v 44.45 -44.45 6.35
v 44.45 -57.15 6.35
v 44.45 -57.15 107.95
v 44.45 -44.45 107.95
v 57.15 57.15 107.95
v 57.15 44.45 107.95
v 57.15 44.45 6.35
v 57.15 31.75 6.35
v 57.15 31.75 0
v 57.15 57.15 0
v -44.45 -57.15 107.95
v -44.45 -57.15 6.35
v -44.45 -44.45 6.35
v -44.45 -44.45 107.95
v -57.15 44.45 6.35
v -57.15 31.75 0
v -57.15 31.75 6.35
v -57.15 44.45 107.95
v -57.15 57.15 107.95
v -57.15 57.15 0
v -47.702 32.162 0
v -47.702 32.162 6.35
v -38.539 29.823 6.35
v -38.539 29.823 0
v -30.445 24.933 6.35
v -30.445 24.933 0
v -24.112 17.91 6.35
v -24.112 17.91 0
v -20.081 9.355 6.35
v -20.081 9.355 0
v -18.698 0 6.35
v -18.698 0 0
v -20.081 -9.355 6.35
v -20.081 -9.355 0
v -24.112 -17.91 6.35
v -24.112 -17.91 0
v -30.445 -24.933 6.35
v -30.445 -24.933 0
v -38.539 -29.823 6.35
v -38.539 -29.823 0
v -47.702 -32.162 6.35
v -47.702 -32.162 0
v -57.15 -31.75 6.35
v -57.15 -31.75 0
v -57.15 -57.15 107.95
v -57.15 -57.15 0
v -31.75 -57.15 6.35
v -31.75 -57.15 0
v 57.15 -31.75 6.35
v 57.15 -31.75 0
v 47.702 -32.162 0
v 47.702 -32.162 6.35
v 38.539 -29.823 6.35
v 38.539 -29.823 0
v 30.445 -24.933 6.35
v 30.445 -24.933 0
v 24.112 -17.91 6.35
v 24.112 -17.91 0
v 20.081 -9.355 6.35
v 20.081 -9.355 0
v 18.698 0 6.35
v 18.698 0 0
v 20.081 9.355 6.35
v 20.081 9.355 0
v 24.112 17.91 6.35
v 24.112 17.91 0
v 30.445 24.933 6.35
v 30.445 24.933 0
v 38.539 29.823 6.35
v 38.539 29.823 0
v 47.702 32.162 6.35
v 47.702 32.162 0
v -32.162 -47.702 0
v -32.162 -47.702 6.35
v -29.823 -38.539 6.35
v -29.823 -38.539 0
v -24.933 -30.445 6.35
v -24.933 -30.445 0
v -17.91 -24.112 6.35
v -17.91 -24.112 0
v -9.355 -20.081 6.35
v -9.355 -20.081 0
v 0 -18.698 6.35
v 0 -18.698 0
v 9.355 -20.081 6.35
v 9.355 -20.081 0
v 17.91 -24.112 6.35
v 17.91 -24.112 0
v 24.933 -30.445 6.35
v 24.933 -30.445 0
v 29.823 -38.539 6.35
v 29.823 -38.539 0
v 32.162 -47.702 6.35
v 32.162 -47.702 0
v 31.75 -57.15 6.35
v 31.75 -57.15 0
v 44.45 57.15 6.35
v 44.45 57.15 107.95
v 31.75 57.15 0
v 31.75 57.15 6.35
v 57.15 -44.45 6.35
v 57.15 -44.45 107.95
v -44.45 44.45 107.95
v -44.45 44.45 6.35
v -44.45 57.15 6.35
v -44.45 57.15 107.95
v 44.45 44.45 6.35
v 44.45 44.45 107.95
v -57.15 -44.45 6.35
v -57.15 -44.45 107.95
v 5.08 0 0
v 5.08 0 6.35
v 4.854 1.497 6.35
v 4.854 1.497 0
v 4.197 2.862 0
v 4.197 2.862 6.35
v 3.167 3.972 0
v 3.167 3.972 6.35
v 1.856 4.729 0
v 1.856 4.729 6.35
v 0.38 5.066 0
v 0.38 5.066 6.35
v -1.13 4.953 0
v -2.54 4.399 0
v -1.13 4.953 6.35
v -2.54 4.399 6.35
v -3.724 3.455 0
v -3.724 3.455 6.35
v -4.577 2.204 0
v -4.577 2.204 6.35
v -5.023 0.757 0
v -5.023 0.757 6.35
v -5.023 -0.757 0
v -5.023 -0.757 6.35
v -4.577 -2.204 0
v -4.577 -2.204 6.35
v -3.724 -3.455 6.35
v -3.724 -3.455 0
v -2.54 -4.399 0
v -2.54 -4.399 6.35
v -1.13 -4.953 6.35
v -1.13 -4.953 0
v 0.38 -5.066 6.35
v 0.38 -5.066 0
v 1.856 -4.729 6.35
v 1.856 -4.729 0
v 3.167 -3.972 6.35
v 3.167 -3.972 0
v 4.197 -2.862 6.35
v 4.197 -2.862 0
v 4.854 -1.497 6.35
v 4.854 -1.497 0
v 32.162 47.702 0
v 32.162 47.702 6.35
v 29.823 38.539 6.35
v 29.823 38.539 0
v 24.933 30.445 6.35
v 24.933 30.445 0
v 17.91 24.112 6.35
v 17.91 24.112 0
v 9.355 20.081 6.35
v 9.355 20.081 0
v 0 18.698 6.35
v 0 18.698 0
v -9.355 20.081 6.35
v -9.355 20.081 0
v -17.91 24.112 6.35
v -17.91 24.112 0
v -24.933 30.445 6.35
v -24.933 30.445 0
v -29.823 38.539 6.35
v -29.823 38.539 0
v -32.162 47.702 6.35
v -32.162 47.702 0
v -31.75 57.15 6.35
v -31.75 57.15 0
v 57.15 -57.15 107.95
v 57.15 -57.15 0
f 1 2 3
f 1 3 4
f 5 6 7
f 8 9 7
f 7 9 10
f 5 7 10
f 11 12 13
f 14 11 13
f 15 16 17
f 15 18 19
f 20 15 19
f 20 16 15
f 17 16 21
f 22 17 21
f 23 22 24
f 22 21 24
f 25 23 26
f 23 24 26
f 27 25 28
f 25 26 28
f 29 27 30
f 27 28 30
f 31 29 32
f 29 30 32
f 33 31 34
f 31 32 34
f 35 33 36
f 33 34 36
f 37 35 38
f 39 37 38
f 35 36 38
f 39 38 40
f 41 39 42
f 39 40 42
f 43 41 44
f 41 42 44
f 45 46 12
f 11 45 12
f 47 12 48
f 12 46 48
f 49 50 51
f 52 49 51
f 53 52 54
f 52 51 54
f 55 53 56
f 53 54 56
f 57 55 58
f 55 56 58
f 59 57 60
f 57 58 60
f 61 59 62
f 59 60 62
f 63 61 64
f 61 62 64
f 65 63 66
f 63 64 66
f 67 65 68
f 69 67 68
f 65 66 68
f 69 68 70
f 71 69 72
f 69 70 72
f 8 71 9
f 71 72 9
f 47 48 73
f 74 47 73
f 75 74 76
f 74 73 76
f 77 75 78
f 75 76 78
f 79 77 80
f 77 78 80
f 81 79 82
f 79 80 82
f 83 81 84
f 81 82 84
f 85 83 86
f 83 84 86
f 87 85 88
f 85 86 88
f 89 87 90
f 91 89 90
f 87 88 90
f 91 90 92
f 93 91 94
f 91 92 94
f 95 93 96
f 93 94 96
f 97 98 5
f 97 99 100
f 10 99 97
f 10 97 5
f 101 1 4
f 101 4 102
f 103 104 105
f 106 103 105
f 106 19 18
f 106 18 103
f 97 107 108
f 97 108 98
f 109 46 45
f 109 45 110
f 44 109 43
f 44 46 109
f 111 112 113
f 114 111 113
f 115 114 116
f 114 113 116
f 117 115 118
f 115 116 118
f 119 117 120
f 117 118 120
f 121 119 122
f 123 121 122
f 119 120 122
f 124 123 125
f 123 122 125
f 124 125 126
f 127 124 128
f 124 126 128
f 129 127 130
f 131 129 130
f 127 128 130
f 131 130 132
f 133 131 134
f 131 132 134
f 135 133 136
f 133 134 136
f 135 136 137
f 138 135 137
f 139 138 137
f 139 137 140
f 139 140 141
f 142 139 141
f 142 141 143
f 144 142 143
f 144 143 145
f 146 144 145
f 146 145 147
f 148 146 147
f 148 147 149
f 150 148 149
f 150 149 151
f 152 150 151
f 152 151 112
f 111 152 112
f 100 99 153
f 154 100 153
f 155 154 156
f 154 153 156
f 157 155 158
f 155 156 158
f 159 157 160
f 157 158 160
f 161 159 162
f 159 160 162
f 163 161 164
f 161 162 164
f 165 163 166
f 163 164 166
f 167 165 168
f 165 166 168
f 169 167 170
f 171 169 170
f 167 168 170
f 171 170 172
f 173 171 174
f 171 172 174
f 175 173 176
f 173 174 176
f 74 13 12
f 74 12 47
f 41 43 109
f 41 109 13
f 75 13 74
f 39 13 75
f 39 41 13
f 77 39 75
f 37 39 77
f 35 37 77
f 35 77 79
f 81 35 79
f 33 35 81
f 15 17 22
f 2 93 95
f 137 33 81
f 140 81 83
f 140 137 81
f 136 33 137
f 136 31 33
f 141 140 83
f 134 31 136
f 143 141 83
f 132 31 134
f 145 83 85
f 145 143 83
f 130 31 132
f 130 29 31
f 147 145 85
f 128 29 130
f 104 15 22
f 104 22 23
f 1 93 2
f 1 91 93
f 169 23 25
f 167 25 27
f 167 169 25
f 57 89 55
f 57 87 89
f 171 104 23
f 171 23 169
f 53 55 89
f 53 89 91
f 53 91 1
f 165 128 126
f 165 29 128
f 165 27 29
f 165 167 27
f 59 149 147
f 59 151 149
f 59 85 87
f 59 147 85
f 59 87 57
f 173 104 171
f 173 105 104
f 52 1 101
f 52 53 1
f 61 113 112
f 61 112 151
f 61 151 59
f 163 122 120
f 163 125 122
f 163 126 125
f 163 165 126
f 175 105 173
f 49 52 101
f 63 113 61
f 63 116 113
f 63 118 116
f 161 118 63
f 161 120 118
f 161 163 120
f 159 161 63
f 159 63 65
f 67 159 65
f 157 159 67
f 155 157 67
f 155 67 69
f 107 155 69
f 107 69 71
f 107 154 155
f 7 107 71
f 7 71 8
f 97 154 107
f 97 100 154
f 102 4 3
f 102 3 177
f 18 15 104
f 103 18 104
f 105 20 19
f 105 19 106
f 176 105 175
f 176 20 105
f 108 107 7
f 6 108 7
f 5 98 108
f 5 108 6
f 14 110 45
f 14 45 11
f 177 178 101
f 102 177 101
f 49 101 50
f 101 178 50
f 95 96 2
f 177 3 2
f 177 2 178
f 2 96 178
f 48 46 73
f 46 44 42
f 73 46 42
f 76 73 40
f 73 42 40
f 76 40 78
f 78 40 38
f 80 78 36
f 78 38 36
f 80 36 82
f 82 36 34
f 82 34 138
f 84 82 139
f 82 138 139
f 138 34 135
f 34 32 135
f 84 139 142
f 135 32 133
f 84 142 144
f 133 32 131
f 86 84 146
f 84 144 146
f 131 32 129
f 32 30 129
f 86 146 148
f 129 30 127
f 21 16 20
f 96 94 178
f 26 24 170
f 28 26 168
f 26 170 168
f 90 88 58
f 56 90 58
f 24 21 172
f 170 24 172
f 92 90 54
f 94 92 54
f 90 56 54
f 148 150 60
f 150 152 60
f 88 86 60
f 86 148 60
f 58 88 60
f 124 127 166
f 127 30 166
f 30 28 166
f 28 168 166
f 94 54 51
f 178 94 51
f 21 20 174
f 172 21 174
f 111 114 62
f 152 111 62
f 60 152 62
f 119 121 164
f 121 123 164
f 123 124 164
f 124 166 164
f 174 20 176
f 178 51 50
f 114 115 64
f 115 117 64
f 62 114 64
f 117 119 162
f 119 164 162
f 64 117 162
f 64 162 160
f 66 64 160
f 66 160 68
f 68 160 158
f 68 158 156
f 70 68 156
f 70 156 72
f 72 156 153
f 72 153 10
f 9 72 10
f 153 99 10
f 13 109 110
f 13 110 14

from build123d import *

# Parameters (mm, degrees)
F0_W     = 114.3
F0_H     = 114.3
F1_DEPTH = 6.35
F3_R     = 5.08
F4_DEPTH = 25.4
F2_W     = 12.7
F2_H     = 12.7
F5_DEPTH = 101.6
F7_DEPTH = 107.951


with BuildPart() as f1:
    # F0 (on Top) → F1 (new body)
    with BuildSketch(Plane.XY):
        Rectangle(F0_W, F0_H)
    extrude(amount=F1_DEPTH)

    # F3 (on face) → F4 (cut)
    with BuildSketch(Plane.XY.offset(6.35)):
        Circle(F3_R)
    extrude(amount=-F4_DEPTH, mode=Mode.SUBTRACT)

    # F2 (on face) → F5 (join)
    with BuildSketch(Plane.XY.offset(6.35)):
        with Locations((50.8, 50.8)):
            Rectangle(F2_W, F2_H)
        with Locations((-50.8, 50.8)):
            Rectangle(F2_W, F2_H)
        with Locations((-50.8, -50.8)):
            Rectangle(F2_W, F2_H)
        with Locations((50.8, -50.8)):
            Rectangle(F2_W, F2_H)
    extrude(amount=F5_DEPTH)

    # F6 (on face) → F7 (cut, through all)
    with BuildSketch(Plane(origin=(0, 0, 0), x_dir=(1, 0, 0), z_dir=(0, 0, -1))):
        with BuildLine():
            Line((-57.15, 31.75), (-57.15, -31.75))
            ThreePointArc((-57.15, -31.75), (-18.698453, 0), (-57.15, 31.75))
        make_face()
        with BuildLine():
            Line((-31.75, -57.15), (31.75, -57.15))
            ThreePointArc((31.75, -57.15), (0, -18.698453), (-31.75, -57.15))
        make_face()
        with BuildLine():
            Line((57.15, -31.75), (57.15, 31.75))
            ThreePointArc((57.15, 31.75), (18.698453, 0), (57.15, -31.75))
        make_face()
        with BuildLine():
            Line((31.75, 57.15), (-31.75, 57.15))
            ThreePointArc((-31.75, 57.15), (0, 18.698453), (31.75, 57.15))
        make_face()
    extrude(amount=-F7_DEPTH, mode=Mode.SUBTRACT)


solid = f1.part
